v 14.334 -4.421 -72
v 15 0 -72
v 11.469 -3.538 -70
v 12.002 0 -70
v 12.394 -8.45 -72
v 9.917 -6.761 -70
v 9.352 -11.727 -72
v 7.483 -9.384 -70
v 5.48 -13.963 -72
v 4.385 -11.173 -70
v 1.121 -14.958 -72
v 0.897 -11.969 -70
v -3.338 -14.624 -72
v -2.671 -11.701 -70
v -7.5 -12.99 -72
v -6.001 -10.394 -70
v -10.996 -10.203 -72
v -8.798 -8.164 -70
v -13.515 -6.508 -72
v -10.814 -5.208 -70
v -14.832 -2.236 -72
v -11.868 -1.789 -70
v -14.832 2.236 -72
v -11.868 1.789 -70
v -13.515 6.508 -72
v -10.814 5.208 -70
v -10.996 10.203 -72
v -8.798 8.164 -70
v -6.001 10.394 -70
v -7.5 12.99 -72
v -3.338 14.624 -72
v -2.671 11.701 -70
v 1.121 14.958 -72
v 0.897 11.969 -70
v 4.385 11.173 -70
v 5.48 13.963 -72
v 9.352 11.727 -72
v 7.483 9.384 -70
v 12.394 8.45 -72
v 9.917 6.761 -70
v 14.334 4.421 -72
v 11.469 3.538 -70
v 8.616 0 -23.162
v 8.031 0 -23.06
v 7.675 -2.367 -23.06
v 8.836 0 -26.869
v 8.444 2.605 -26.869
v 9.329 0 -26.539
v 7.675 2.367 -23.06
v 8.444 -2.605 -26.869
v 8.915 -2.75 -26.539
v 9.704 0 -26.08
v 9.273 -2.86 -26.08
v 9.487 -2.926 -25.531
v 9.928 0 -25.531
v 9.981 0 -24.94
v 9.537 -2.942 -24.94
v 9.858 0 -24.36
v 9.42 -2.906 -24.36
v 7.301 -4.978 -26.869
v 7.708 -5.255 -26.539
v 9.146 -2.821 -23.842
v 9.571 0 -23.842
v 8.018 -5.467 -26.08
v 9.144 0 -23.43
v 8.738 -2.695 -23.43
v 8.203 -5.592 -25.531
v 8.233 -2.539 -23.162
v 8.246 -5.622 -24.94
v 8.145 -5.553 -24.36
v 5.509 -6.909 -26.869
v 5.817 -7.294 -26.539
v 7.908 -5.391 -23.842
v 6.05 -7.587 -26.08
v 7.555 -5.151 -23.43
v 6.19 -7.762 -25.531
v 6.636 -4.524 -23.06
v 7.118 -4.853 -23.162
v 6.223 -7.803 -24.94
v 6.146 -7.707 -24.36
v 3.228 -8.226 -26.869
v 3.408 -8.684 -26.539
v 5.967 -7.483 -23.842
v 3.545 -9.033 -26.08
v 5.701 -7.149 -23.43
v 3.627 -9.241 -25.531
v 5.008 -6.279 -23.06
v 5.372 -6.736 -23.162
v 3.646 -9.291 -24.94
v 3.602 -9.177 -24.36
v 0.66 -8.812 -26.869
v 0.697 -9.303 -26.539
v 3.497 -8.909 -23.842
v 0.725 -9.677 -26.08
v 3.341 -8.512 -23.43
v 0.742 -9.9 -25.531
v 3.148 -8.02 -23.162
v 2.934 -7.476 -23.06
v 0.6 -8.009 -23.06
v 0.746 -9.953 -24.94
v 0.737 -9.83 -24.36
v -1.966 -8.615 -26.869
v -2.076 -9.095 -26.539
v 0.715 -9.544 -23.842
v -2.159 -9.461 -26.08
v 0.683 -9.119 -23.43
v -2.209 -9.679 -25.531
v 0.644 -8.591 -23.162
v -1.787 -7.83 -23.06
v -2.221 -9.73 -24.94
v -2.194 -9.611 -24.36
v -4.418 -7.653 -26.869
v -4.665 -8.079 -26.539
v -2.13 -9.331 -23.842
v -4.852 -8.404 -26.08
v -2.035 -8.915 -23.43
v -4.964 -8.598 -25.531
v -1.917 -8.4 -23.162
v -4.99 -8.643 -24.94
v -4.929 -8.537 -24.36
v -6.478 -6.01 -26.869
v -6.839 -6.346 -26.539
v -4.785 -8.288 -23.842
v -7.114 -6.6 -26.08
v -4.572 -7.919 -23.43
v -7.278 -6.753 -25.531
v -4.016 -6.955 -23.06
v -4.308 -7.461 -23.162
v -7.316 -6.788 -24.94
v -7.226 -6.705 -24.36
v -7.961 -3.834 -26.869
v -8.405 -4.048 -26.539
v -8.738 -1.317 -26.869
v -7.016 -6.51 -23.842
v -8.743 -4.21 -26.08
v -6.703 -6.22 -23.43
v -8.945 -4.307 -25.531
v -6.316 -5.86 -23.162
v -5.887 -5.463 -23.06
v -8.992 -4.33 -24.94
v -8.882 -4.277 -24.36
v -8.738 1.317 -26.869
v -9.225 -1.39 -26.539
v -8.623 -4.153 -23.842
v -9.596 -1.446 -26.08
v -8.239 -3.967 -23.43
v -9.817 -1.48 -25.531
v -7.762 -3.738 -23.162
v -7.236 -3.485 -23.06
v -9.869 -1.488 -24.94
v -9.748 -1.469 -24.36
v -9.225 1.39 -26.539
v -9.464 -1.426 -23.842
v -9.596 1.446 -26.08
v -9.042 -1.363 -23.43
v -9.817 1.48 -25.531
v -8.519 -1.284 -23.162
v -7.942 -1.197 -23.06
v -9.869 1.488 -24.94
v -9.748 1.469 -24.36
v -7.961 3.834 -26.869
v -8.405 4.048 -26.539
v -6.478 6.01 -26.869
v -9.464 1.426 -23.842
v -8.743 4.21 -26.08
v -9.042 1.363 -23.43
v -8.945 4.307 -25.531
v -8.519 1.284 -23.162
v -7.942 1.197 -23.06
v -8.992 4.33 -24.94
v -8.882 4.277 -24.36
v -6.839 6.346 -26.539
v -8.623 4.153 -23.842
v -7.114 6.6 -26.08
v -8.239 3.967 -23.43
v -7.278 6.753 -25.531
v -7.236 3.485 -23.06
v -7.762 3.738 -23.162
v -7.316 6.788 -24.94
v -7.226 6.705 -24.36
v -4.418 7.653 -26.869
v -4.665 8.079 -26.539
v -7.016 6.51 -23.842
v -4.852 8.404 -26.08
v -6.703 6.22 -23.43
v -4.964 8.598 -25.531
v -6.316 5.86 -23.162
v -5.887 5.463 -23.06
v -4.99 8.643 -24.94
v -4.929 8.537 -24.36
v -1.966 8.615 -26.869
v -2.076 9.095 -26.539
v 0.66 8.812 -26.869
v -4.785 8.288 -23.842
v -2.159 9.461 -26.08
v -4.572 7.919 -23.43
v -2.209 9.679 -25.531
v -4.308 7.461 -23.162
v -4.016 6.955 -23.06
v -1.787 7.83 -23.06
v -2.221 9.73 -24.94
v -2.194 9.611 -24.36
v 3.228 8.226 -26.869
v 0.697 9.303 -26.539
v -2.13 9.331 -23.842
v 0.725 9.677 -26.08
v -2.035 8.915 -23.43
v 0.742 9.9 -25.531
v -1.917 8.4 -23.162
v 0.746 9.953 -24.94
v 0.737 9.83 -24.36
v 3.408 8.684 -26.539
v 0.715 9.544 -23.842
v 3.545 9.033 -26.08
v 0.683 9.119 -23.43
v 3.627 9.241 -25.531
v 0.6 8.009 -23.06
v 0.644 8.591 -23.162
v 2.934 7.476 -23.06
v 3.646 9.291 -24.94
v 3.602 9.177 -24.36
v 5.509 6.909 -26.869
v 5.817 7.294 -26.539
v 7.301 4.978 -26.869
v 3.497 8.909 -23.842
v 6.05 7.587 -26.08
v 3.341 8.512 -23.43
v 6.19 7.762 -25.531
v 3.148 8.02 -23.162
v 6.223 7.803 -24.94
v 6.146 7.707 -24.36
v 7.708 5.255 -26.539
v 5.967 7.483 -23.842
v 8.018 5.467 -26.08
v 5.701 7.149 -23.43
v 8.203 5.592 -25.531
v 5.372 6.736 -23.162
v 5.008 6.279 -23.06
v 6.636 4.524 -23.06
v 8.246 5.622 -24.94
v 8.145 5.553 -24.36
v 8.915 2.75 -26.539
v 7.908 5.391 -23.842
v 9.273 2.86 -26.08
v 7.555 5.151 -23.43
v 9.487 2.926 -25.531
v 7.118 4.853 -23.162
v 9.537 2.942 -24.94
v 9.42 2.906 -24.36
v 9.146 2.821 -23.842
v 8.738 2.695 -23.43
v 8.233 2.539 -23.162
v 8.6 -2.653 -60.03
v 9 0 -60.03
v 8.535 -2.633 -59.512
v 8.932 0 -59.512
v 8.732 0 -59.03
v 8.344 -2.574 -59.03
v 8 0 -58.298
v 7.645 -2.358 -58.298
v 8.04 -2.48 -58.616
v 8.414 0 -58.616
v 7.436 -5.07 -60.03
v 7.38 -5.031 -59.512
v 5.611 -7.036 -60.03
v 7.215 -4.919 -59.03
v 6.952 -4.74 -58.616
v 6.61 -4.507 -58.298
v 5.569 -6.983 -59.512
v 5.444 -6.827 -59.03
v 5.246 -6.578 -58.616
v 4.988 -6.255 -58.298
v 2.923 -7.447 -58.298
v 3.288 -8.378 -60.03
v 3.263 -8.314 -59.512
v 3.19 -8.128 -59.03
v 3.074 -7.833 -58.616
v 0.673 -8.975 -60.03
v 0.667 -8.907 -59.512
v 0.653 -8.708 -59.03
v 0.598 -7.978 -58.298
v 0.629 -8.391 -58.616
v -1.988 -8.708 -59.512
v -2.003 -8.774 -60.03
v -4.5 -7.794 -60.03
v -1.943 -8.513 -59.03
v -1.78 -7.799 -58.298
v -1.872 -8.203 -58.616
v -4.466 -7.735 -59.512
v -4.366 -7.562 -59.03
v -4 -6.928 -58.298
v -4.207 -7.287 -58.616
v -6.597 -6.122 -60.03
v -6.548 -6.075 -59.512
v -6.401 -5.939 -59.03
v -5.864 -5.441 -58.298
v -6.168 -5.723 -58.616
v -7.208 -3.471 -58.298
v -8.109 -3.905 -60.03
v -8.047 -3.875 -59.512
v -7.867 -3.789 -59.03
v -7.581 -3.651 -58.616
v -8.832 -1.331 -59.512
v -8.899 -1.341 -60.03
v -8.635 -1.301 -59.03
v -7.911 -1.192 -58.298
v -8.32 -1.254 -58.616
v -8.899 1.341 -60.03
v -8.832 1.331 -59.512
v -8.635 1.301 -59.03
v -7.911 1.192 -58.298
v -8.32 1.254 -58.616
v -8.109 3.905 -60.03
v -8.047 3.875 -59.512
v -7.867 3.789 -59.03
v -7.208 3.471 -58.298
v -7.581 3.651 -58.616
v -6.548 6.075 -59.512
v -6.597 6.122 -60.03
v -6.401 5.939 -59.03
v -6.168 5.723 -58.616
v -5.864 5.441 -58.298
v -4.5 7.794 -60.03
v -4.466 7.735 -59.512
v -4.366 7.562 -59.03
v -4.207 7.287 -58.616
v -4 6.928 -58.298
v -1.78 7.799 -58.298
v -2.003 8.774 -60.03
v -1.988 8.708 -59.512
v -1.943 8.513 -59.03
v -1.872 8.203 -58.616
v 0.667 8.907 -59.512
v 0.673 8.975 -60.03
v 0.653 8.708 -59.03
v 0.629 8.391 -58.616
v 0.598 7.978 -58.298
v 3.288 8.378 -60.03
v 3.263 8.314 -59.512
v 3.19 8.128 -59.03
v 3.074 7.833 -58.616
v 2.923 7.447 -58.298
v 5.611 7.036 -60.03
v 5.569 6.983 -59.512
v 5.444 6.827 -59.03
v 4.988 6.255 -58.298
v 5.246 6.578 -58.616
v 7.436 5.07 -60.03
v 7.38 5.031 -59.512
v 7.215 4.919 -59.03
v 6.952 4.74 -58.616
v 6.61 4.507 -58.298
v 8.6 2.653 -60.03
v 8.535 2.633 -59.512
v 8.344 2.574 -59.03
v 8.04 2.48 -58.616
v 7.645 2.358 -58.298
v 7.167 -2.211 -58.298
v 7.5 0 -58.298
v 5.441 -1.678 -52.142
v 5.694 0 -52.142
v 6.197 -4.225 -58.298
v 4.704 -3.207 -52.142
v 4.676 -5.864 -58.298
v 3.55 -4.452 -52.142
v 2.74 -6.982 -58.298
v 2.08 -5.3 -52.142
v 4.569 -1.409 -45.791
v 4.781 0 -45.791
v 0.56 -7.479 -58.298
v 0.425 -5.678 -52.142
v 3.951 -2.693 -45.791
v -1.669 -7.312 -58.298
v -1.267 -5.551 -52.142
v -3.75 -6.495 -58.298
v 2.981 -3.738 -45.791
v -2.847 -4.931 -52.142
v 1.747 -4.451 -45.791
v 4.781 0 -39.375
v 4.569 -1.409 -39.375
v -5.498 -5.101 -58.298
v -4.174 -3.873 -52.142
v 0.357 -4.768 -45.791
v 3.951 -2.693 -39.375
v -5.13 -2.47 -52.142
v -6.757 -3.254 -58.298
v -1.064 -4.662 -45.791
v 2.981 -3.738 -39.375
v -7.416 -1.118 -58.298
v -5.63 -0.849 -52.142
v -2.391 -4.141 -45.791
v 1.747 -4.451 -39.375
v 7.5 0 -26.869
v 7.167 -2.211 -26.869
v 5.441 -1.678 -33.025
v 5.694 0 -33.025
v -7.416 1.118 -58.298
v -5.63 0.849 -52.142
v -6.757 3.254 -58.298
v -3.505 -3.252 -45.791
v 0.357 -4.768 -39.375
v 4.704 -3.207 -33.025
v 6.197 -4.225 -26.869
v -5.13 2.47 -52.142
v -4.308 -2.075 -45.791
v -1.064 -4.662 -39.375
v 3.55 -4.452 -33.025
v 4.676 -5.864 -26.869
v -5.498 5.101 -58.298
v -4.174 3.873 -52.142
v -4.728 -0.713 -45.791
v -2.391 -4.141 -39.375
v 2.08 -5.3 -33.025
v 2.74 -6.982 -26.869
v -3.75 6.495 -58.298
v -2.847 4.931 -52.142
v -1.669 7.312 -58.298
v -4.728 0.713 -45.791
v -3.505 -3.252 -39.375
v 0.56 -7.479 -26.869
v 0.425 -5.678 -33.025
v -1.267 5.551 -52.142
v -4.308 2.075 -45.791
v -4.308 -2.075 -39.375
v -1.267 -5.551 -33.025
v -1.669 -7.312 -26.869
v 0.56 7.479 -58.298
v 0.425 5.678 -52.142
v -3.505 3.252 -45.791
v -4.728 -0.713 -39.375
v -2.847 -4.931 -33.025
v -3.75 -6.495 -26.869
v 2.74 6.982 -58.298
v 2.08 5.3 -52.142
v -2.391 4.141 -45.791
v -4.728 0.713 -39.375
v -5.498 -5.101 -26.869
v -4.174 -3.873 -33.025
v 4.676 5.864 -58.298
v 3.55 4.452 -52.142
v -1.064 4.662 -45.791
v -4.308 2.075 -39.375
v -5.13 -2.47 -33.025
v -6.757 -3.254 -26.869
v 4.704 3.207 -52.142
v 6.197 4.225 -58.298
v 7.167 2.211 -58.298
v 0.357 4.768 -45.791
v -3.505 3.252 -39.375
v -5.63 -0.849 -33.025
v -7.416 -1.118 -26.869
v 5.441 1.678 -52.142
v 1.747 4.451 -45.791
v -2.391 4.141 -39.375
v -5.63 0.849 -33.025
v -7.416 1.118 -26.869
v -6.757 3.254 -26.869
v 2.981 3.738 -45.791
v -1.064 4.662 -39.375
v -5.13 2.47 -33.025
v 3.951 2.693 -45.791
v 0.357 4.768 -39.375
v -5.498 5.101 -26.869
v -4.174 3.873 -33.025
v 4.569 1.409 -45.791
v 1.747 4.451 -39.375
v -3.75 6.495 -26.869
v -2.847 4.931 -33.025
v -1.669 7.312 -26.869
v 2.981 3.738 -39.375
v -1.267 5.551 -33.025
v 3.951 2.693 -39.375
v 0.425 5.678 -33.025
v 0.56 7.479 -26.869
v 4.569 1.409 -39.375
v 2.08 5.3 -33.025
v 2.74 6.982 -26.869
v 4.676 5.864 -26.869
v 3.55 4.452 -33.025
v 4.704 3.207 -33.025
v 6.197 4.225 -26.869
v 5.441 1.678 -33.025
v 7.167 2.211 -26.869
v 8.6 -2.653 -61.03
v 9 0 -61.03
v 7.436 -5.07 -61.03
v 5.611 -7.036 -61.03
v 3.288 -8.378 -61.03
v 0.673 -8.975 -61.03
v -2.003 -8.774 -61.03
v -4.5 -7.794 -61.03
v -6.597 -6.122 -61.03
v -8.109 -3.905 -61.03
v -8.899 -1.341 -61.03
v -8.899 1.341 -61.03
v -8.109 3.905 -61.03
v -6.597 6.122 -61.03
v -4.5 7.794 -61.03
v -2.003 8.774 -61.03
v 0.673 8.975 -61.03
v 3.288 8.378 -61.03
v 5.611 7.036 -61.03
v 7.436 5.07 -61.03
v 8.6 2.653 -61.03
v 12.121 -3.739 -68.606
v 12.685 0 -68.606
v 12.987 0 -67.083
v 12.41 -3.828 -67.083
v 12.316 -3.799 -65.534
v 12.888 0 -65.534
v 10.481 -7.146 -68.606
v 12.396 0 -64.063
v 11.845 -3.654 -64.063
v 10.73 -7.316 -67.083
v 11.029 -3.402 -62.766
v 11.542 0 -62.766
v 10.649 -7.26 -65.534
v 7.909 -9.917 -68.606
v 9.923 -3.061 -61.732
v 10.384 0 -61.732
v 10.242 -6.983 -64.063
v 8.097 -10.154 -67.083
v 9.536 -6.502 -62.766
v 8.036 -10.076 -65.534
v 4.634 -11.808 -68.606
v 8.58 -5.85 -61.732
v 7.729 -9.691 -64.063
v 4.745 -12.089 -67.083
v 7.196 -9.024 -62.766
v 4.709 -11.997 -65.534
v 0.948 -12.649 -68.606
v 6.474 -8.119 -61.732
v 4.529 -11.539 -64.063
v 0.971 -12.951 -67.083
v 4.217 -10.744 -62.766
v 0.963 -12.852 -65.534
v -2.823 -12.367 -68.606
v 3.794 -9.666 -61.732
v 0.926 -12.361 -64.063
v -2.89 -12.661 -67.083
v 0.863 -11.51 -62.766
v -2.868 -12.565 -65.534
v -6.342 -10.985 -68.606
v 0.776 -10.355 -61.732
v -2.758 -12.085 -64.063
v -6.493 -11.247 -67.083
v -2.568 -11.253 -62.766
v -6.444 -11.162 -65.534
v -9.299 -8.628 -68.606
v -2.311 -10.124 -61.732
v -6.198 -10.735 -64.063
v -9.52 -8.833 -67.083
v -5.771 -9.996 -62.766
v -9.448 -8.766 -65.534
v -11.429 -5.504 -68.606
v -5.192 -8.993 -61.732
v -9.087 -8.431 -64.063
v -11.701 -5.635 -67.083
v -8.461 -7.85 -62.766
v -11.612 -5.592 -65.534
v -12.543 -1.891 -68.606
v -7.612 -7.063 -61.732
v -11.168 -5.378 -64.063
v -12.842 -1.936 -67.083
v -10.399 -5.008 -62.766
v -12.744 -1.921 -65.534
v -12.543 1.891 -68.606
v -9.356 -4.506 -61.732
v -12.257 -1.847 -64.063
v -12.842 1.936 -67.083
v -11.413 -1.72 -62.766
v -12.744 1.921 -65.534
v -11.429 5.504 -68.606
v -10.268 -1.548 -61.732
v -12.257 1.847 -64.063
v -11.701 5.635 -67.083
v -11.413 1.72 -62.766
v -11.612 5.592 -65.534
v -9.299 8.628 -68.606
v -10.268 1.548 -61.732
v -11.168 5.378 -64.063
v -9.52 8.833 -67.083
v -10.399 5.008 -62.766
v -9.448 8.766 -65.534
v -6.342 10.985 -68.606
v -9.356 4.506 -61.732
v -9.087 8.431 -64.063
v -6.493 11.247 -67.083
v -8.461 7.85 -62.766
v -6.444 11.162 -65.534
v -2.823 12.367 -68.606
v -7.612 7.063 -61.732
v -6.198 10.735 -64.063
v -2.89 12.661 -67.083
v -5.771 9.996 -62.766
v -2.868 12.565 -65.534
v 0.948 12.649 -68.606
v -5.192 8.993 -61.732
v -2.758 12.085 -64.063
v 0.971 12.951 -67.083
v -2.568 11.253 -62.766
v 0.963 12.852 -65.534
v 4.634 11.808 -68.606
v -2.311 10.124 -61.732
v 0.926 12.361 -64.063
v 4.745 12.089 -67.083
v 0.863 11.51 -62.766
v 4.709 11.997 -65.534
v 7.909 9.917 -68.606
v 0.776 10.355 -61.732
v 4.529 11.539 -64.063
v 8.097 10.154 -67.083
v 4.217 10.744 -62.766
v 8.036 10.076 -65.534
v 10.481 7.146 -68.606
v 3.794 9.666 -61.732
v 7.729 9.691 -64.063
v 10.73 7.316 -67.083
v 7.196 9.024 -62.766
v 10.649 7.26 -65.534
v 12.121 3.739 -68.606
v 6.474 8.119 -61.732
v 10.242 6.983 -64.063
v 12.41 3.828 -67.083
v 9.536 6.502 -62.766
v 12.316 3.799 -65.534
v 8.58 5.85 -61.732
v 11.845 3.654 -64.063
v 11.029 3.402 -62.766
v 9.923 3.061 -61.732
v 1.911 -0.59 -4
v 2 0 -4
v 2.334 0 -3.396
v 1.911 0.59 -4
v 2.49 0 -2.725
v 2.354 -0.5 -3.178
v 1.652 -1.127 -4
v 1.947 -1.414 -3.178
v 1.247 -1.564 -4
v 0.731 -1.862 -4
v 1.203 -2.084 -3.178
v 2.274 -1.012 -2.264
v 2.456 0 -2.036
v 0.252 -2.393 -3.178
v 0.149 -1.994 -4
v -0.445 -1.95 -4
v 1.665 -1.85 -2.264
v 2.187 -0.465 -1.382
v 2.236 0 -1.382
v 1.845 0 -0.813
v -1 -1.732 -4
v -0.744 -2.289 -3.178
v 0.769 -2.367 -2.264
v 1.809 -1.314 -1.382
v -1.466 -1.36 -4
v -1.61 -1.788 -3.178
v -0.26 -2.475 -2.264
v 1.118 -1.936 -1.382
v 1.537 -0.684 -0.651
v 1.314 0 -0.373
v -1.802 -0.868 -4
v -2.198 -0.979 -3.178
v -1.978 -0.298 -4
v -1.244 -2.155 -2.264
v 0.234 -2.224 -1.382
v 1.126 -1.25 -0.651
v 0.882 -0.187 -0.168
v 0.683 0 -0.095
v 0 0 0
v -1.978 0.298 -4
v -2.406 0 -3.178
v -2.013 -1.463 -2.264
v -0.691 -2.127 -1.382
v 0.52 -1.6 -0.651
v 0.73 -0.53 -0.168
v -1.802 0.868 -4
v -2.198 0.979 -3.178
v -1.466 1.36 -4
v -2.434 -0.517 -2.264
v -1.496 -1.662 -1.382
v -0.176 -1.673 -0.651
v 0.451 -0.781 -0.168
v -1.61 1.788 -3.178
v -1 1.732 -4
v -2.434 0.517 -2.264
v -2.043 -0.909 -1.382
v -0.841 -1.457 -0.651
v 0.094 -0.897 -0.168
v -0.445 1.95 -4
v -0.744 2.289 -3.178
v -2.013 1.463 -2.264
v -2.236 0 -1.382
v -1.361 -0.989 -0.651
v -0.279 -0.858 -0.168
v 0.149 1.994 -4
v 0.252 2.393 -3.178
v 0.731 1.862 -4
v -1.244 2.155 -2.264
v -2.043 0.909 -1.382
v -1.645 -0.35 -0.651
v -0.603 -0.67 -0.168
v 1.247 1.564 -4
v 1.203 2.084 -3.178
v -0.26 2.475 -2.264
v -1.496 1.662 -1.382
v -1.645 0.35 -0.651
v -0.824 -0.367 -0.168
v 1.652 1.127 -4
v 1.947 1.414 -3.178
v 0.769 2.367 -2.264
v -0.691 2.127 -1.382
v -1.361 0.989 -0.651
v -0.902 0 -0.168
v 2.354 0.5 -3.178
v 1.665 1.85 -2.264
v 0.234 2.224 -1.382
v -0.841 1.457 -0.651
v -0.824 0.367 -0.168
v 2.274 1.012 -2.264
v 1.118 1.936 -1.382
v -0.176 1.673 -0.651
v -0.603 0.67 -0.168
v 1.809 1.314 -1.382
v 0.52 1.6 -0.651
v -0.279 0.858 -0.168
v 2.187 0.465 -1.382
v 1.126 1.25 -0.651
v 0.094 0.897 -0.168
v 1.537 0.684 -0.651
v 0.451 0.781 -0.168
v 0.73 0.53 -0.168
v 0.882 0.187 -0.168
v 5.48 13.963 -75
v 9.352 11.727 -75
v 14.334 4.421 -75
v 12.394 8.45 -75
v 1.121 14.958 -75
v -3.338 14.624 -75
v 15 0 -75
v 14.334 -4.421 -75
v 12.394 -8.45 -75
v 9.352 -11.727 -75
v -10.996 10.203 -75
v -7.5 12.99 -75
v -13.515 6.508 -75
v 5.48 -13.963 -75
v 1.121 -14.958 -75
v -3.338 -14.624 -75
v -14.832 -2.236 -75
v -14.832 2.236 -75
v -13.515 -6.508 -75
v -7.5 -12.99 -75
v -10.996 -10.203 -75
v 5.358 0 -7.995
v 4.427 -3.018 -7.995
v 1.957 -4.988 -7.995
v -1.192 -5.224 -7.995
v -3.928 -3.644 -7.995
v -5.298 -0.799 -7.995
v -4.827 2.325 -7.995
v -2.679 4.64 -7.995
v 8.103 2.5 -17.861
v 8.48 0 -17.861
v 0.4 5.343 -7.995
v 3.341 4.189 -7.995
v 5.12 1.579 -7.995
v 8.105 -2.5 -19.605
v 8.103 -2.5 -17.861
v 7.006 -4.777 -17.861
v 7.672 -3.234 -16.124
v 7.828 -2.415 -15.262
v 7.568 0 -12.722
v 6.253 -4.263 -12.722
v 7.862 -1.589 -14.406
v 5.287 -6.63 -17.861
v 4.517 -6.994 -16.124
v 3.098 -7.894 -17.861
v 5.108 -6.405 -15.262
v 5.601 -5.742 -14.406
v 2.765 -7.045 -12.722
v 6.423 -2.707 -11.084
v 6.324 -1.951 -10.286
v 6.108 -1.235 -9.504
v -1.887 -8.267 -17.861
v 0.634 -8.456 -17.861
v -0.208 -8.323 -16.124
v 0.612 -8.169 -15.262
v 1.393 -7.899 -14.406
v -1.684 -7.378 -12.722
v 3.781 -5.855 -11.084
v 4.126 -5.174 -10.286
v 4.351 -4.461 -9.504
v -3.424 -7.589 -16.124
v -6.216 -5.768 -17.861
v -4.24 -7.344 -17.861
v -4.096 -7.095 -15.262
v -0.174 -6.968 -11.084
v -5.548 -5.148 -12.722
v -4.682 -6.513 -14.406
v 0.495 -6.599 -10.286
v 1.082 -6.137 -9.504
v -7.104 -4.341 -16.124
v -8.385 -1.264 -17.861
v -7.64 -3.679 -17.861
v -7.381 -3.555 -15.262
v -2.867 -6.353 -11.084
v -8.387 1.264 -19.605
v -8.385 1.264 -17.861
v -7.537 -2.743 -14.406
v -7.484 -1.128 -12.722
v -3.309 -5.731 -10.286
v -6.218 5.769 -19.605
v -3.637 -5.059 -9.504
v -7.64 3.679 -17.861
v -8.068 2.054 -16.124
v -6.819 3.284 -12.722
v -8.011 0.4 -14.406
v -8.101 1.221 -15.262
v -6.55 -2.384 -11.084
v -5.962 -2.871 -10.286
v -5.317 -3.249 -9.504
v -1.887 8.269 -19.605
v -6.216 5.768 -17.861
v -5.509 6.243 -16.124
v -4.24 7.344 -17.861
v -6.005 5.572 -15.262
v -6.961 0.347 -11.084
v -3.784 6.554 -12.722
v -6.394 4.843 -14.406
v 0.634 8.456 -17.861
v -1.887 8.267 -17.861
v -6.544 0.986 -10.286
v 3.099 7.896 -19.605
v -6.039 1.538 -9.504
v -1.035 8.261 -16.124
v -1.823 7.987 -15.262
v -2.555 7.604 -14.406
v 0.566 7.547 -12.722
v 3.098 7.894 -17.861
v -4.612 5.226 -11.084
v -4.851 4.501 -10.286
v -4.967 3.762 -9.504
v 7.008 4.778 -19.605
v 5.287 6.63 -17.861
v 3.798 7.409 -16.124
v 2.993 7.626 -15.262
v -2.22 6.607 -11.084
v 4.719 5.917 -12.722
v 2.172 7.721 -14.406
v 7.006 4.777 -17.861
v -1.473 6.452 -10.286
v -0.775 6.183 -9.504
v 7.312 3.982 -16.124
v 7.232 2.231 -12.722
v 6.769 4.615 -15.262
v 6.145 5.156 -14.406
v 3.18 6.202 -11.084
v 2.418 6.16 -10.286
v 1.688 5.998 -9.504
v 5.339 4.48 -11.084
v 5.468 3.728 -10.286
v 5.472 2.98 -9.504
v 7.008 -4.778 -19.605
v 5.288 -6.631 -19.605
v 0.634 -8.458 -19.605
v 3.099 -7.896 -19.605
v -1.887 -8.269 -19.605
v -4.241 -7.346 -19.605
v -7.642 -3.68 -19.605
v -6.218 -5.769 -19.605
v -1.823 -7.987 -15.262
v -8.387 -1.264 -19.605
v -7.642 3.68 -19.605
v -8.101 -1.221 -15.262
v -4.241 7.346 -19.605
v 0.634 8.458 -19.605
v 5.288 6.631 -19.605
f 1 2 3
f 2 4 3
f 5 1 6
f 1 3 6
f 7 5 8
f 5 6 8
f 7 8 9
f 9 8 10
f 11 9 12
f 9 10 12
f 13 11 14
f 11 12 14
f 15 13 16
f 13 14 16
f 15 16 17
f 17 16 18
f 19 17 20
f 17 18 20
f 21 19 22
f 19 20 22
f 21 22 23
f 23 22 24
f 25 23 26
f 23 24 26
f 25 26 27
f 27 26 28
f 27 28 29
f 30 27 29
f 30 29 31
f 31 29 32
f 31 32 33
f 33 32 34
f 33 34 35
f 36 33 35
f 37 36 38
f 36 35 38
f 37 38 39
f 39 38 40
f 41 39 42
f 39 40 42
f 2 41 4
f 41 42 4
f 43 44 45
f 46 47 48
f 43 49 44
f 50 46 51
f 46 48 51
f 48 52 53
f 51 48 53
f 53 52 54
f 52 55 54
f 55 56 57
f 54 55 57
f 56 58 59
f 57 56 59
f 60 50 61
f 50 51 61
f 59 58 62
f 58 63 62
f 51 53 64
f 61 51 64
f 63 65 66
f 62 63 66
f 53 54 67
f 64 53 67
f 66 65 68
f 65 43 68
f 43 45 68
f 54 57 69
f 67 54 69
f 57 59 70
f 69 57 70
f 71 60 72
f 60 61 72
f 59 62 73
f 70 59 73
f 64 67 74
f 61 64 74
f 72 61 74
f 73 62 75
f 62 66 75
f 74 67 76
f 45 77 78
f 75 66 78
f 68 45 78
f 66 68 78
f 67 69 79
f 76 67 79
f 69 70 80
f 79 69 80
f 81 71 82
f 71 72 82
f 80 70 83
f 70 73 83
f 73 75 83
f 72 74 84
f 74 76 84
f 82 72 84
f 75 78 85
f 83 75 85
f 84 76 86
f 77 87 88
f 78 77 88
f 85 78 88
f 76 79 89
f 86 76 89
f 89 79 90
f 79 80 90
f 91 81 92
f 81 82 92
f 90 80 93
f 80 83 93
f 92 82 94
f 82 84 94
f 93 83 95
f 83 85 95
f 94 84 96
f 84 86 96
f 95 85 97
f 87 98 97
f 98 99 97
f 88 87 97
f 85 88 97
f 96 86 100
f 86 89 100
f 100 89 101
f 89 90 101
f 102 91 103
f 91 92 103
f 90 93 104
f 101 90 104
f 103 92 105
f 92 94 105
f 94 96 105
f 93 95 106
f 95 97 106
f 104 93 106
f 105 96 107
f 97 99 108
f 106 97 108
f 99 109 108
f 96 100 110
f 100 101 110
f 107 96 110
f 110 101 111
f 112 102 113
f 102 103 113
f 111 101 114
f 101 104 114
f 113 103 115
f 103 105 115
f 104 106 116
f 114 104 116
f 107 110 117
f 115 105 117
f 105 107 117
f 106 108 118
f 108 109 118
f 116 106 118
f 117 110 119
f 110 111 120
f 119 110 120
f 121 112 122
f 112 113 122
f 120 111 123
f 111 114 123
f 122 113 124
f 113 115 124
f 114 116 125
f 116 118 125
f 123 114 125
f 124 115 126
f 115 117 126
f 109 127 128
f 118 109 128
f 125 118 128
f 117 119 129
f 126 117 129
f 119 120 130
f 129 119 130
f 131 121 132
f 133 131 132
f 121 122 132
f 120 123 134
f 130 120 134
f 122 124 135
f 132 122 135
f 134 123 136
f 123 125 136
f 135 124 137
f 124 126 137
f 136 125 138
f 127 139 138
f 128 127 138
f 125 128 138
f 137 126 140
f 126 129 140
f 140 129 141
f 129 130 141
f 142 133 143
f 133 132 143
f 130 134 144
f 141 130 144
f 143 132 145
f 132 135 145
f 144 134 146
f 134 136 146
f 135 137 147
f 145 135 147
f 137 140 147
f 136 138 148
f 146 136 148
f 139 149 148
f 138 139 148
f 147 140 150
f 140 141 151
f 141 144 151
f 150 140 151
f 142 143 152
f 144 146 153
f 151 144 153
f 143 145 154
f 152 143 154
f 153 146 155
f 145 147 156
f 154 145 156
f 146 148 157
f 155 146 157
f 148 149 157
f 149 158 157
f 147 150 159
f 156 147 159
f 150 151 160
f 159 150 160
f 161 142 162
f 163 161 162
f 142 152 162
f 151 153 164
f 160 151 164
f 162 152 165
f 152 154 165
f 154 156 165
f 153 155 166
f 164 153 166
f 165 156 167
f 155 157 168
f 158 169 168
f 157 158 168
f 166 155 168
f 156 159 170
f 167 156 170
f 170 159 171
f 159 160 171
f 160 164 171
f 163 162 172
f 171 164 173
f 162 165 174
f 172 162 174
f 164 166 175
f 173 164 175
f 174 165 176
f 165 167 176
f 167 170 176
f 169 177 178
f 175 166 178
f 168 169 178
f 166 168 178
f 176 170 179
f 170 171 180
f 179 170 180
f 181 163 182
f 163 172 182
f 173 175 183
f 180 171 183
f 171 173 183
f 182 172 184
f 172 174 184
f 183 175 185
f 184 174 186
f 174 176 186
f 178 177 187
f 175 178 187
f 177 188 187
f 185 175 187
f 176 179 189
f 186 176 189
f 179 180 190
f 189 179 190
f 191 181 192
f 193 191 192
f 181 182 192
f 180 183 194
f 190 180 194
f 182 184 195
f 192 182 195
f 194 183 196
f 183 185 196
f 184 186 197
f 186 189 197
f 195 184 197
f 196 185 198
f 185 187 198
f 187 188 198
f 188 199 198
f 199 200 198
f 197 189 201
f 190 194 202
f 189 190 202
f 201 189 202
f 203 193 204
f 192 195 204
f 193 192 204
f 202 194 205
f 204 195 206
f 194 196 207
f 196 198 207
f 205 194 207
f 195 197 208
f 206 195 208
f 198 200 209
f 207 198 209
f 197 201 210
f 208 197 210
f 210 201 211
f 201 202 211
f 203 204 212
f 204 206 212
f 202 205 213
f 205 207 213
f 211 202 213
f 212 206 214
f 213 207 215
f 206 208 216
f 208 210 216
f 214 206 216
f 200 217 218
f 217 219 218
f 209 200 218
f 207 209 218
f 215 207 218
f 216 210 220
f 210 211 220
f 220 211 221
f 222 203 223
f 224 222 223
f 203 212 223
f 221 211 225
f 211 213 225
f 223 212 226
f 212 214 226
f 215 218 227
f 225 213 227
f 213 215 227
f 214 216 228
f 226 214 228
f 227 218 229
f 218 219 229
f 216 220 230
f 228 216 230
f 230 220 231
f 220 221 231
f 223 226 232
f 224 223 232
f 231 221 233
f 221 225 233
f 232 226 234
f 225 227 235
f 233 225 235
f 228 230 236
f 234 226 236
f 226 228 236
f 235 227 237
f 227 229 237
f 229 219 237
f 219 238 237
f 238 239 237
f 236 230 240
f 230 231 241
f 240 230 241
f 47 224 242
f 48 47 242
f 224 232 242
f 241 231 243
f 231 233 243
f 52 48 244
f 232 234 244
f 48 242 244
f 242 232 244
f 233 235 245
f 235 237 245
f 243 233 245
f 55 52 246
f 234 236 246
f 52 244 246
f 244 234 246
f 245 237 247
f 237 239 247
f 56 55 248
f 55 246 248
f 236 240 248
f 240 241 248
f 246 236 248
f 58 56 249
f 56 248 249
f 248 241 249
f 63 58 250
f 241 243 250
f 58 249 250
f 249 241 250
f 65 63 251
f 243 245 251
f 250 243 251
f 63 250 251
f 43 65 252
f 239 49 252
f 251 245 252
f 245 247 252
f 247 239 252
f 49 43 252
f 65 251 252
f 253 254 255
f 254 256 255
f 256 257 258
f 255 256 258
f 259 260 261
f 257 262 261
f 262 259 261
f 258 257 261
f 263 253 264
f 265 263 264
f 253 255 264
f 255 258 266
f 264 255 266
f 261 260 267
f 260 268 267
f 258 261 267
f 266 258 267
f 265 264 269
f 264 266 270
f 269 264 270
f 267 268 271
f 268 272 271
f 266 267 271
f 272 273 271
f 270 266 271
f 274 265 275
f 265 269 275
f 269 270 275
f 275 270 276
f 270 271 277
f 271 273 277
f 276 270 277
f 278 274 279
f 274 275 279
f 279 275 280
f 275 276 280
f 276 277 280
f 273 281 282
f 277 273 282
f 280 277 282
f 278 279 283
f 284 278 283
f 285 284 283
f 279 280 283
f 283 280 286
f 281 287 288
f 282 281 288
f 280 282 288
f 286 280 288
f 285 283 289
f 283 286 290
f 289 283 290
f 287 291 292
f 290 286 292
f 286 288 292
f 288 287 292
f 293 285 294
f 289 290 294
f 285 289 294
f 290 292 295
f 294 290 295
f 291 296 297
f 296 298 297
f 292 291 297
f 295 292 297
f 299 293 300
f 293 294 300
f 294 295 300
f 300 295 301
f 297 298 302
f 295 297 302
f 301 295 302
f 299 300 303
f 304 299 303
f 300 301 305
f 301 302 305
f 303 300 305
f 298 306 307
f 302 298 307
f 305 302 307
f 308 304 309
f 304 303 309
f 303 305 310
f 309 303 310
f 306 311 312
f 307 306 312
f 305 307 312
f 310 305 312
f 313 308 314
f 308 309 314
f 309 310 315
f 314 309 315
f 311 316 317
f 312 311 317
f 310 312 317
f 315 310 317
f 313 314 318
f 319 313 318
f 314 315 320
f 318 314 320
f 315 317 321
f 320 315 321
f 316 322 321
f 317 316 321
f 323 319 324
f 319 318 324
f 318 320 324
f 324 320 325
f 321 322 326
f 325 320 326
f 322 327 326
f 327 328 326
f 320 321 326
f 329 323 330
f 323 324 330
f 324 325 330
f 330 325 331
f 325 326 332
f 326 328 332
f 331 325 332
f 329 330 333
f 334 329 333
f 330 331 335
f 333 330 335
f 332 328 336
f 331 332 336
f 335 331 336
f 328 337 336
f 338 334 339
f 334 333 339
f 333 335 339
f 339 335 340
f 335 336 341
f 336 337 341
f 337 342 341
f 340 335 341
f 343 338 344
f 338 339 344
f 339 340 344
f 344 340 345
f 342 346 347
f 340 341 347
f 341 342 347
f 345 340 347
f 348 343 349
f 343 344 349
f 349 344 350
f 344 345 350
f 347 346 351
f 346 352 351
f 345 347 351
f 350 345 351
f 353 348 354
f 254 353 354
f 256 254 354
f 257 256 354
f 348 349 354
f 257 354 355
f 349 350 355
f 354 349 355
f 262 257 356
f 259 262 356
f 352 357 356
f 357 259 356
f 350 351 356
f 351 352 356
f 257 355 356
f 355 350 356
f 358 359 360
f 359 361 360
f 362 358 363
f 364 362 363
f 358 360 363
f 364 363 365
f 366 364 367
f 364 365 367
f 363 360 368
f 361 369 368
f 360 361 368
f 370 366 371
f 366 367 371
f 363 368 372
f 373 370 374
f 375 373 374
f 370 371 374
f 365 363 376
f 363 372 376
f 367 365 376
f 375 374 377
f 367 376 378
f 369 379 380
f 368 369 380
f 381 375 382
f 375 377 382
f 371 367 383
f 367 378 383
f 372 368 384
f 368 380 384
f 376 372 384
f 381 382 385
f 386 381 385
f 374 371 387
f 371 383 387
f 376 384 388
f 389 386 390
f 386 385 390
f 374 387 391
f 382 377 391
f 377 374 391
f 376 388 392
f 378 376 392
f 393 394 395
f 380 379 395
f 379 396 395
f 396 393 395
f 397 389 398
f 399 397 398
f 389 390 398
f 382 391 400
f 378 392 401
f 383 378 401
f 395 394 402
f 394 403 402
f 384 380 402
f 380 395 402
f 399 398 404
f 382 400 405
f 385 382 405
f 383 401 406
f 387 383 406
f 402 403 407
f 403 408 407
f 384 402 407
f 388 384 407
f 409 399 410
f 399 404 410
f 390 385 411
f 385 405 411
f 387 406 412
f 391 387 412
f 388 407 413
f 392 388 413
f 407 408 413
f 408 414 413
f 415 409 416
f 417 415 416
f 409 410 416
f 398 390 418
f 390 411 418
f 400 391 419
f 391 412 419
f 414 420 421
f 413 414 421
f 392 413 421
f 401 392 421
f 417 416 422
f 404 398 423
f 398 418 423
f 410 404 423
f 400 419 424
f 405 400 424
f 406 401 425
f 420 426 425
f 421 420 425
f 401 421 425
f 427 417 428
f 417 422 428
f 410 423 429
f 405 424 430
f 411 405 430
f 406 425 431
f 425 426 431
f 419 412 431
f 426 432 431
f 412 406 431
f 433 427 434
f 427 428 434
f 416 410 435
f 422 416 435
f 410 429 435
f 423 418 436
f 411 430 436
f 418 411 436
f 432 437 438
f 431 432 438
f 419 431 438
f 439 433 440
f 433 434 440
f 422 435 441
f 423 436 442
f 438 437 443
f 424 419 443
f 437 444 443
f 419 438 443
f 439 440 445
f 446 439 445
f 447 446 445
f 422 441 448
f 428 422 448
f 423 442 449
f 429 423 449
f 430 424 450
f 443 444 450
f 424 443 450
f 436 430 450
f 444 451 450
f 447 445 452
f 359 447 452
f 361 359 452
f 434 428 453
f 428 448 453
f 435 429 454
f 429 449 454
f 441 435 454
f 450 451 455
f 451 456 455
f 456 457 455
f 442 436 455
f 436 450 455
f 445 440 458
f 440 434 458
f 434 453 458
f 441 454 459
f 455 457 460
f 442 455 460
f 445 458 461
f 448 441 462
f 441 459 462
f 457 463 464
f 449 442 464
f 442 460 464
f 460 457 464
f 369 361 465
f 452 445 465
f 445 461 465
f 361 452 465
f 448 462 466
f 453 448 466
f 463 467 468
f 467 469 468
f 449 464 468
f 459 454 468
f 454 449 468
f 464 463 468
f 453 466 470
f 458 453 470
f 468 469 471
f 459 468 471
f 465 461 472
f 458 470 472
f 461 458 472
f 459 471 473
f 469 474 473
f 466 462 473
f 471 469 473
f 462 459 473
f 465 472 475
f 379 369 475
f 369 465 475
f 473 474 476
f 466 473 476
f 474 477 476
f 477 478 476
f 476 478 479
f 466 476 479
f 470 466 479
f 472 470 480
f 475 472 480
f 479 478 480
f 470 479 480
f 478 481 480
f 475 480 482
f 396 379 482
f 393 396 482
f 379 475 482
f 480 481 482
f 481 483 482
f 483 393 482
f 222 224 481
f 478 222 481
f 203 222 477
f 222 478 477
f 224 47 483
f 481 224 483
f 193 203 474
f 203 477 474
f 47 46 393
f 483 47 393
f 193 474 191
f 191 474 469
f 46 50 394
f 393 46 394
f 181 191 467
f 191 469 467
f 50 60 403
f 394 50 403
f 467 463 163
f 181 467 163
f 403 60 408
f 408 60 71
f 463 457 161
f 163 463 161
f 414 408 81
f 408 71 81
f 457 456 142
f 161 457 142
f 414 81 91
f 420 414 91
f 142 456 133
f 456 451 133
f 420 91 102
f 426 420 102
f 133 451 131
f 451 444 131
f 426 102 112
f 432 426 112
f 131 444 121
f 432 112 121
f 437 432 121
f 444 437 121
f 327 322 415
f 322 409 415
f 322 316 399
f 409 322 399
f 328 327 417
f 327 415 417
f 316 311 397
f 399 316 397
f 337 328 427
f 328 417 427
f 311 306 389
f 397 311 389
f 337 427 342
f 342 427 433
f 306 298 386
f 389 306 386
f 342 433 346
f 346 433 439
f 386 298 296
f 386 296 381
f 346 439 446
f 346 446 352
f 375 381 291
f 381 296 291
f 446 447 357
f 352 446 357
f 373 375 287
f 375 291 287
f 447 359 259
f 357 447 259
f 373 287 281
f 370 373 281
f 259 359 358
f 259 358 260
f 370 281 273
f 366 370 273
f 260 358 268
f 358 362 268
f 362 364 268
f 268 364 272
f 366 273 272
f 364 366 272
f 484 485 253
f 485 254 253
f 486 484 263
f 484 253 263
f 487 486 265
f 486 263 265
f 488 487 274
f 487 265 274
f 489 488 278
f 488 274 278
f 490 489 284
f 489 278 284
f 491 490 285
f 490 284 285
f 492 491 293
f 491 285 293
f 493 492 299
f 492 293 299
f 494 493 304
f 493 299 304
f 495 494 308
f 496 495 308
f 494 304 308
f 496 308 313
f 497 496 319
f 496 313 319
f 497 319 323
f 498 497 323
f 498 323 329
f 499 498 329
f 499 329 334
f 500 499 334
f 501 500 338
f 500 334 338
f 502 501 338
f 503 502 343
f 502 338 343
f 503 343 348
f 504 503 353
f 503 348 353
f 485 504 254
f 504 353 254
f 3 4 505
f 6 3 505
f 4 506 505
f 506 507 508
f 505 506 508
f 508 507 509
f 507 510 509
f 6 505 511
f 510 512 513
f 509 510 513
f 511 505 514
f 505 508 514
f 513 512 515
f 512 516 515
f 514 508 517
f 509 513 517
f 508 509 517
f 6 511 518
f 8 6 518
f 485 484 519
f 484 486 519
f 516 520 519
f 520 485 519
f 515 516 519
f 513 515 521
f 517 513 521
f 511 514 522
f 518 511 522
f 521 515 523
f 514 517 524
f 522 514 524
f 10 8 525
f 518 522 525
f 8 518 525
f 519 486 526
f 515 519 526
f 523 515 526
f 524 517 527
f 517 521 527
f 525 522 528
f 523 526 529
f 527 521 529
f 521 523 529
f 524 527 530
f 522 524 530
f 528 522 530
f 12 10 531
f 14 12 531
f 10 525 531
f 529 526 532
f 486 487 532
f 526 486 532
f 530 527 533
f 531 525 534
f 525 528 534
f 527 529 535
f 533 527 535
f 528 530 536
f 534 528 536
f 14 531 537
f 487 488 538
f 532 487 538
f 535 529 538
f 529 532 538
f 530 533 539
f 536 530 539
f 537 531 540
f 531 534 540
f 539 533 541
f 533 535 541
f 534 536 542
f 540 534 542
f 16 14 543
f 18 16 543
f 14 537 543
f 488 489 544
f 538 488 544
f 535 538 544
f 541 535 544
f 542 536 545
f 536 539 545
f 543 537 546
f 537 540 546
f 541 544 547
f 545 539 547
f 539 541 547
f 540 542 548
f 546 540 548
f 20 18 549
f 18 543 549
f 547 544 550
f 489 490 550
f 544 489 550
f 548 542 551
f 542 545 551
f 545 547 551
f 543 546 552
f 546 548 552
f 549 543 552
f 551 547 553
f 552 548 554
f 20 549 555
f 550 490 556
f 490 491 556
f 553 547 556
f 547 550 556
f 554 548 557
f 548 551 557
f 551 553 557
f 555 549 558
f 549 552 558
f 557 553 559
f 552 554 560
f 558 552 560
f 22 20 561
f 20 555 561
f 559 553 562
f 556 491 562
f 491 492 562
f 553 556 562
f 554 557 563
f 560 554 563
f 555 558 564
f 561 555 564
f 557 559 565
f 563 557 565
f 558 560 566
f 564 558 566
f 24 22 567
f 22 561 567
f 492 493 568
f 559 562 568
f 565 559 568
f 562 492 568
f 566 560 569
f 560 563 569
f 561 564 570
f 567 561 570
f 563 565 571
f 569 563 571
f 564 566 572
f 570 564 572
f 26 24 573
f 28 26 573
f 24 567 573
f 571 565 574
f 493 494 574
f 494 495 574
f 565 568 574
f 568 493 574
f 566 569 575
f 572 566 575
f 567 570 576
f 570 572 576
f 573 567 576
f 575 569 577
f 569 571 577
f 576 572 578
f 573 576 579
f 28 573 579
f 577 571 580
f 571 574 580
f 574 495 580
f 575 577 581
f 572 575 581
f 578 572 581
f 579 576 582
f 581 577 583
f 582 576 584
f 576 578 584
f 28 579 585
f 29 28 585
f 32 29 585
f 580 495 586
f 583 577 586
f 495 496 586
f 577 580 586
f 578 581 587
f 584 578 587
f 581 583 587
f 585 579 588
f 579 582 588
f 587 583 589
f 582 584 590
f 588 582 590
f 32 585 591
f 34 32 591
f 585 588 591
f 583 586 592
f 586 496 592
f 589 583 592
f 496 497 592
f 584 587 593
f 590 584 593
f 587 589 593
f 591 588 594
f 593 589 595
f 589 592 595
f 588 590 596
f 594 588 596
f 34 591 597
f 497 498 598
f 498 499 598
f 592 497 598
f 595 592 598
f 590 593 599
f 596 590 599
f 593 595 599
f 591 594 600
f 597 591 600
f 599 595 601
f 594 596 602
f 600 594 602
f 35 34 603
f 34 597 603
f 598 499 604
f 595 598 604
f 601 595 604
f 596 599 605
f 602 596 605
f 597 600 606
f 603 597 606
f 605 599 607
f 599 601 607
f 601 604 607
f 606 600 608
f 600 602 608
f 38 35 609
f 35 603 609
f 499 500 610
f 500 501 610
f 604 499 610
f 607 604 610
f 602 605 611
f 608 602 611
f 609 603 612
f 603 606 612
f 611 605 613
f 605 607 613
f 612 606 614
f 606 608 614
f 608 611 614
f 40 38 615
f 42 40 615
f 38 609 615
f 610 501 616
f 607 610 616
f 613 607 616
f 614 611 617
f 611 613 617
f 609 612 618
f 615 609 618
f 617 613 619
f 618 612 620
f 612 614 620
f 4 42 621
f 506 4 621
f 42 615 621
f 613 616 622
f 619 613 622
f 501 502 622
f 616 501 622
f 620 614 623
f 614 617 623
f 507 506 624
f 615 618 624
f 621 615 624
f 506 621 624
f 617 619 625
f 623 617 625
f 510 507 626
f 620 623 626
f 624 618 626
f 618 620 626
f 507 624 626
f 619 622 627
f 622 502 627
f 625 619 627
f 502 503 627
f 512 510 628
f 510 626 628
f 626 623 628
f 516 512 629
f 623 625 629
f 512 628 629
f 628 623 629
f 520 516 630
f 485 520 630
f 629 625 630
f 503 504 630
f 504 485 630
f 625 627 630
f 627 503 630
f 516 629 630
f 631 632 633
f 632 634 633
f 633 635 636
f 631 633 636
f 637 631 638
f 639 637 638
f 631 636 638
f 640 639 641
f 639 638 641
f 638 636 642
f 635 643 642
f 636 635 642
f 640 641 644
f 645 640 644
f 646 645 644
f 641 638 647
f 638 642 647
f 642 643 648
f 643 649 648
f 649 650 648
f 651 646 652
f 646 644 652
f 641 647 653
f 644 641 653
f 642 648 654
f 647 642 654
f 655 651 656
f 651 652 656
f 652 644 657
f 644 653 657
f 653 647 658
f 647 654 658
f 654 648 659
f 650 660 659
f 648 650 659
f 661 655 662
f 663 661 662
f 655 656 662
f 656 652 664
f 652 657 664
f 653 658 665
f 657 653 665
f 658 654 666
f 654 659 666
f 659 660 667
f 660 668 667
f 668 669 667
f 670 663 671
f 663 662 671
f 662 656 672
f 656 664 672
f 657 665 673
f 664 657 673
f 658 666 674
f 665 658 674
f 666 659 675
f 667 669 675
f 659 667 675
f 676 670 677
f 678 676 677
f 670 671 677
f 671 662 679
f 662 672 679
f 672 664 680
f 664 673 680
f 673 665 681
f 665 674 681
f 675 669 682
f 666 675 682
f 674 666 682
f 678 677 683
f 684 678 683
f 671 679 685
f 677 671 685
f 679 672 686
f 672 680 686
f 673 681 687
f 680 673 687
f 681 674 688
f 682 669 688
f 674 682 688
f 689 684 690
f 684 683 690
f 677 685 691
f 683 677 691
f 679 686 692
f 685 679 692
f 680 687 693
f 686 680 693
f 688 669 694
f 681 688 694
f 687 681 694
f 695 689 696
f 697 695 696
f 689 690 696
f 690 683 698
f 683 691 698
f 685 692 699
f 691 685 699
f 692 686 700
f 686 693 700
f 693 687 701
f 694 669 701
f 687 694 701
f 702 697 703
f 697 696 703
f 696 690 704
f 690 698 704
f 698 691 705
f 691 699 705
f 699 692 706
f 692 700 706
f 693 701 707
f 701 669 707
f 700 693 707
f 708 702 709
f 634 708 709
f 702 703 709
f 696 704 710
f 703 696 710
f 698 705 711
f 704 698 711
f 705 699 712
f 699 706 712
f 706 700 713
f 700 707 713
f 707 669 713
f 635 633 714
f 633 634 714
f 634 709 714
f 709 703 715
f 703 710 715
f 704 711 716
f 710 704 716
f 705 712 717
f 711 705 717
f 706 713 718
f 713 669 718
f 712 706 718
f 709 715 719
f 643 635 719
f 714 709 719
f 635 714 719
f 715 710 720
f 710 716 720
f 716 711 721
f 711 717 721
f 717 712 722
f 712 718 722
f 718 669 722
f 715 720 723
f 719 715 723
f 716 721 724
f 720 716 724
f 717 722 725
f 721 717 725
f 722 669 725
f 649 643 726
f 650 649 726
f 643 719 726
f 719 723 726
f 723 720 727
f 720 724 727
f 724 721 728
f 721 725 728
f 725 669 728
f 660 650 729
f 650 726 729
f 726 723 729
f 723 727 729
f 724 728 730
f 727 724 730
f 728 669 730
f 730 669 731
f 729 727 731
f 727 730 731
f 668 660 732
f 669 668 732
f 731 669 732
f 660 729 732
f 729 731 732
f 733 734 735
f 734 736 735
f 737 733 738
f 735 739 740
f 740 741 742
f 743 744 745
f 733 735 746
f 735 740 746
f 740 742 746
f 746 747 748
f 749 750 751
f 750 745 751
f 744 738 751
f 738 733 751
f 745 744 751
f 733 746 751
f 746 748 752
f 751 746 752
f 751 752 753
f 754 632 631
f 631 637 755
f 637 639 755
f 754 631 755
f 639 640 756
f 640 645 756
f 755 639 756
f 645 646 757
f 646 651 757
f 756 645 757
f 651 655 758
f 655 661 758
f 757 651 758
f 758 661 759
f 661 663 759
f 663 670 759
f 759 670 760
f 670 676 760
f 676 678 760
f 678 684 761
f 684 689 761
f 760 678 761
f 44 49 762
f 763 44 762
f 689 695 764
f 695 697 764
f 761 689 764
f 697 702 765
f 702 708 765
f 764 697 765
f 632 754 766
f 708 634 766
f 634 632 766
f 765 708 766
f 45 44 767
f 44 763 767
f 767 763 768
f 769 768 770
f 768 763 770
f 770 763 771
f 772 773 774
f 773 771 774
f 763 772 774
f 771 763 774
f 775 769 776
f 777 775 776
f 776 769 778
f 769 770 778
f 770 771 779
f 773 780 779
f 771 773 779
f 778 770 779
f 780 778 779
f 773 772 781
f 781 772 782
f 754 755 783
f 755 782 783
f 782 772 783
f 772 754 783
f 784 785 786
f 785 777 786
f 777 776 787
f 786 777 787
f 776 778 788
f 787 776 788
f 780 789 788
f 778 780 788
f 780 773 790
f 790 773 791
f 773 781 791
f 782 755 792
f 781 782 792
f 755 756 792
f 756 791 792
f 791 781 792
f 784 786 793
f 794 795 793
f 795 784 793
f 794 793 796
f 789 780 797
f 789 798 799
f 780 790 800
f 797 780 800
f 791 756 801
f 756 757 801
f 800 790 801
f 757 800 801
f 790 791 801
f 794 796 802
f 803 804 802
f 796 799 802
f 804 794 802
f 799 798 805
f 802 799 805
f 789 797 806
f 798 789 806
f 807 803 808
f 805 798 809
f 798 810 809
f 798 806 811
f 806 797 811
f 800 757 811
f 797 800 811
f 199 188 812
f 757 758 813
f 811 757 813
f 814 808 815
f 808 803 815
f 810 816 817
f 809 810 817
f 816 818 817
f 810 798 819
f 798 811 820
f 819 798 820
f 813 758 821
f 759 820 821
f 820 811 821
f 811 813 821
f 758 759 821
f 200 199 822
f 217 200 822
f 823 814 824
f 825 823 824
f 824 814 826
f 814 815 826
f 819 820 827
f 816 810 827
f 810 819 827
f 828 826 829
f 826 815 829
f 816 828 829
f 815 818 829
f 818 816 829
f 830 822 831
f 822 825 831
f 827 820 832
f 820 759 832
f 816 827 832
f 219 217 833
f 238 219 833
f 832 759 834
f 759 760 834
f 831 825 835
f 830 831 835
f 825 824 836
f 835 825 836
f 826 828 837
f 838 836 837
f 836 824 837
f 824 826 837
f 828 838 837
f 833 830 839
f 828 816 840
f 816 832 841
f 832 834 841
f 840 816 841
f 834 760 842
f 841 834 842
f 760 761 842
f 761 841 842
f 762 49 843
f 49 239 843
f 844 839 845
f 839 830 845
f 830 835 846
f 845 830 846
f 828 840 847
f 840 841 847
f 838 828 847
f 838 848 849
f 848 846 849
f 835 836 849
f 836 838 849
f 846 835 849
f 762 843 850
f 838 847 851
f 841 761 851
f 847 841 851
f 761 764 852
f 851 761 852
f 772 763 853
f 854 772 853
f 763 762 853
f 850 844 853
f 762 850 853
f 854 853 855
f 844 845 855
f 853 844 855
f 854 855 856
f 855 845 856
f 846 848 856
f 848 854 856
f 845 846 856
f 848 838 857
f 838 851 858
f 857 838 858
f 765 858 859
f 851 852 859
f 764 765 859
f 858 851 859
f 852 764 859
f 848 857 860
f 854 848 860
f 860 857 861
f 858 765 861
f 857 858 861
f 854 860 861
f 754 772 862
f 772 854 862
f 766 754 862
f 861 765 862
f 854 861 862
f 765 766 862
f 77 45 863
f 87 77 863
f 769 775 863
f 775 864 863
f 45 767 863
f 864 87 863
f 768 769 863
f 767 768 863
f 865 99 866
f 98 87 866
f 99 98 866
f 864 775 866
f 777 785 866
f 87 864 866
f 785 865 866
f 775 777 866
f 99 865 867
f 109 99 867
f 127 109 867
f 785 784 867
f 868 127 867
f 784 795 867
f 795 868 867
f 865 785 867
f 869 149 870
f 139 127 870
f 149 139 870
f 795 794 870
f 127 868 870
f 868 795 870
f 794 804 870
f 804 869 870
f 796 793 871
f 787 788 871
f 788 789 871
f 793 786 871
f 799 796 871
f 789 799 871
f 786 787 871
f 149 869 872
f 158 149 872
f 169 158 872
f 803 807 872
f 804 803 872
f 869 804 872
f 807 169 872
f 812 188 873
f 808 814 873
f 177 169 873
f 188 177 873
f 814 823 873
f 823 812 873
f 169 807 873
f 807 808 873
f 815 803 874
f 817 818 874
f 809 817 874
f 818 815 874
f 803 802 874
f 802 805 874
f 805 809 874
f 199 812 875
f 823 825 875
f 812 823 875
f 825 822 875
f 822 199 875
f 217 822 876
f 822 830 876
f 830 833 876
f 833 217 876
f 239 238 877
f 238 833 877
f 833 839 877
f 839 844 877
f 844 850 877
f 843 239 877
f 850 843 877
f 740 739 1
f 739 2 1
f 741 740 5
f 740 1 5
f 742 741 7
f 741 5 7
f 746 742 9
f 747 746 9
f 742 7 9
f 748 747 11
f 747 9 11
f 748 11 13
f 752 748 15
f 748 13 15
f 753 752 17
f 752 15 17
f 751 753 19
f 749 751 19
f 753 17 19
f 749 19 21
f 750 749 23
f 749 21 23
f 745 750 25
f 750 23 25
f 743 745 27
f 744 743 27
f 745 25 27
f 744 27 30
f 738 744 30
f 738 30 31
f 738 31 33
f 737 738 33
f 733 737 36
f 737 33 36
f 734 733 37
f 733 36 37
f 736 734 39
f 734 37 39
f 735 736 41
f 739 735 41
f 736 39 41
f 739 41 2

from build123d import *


with BuildPart() as f1:
    # F0 (on Front) → F1 (revolve)
    with BuildSketch(Plane.XZ):
        with BuildLine():
            ThreePointArc((2, -4), (2.236068, -1.381966), (0, 0))
            Line((0, 0), (0, -75))
            Line((0, -75), (15, -75))
            Line((15, -75), (15, -72))
            Line((15, -72), (12.002306, -70))
            ThreePointArc((12.002306, -70), (12.689754, -64.782464), (9, -61.03))
            Line((9, -61.03), (9, -60.03))
            ThreePointArc((9, -60.03), (8.732051, -59.03), (8, -58.297949))
            Line((8, -58.297949), (7.5, -58.297949))
            ThreePointArc((7.5, -58.297949), (4.666942, -42.583339), (7.5, -26.868728))
            Line((7.5, -26.868728), (8.83642, -26.868728))
            ThreePointArc((8.83642, -26.868728), (9.940865, -24.645891), (8.031478, -23.06))
            ThreePointArc((8.031478, -23.06), (7.56805, -12.722329), (2, -4))
        make_face()
    revolve(axis=Axis((0, 0, -37.5), (0, 0, -1)))


solid = f1.part
